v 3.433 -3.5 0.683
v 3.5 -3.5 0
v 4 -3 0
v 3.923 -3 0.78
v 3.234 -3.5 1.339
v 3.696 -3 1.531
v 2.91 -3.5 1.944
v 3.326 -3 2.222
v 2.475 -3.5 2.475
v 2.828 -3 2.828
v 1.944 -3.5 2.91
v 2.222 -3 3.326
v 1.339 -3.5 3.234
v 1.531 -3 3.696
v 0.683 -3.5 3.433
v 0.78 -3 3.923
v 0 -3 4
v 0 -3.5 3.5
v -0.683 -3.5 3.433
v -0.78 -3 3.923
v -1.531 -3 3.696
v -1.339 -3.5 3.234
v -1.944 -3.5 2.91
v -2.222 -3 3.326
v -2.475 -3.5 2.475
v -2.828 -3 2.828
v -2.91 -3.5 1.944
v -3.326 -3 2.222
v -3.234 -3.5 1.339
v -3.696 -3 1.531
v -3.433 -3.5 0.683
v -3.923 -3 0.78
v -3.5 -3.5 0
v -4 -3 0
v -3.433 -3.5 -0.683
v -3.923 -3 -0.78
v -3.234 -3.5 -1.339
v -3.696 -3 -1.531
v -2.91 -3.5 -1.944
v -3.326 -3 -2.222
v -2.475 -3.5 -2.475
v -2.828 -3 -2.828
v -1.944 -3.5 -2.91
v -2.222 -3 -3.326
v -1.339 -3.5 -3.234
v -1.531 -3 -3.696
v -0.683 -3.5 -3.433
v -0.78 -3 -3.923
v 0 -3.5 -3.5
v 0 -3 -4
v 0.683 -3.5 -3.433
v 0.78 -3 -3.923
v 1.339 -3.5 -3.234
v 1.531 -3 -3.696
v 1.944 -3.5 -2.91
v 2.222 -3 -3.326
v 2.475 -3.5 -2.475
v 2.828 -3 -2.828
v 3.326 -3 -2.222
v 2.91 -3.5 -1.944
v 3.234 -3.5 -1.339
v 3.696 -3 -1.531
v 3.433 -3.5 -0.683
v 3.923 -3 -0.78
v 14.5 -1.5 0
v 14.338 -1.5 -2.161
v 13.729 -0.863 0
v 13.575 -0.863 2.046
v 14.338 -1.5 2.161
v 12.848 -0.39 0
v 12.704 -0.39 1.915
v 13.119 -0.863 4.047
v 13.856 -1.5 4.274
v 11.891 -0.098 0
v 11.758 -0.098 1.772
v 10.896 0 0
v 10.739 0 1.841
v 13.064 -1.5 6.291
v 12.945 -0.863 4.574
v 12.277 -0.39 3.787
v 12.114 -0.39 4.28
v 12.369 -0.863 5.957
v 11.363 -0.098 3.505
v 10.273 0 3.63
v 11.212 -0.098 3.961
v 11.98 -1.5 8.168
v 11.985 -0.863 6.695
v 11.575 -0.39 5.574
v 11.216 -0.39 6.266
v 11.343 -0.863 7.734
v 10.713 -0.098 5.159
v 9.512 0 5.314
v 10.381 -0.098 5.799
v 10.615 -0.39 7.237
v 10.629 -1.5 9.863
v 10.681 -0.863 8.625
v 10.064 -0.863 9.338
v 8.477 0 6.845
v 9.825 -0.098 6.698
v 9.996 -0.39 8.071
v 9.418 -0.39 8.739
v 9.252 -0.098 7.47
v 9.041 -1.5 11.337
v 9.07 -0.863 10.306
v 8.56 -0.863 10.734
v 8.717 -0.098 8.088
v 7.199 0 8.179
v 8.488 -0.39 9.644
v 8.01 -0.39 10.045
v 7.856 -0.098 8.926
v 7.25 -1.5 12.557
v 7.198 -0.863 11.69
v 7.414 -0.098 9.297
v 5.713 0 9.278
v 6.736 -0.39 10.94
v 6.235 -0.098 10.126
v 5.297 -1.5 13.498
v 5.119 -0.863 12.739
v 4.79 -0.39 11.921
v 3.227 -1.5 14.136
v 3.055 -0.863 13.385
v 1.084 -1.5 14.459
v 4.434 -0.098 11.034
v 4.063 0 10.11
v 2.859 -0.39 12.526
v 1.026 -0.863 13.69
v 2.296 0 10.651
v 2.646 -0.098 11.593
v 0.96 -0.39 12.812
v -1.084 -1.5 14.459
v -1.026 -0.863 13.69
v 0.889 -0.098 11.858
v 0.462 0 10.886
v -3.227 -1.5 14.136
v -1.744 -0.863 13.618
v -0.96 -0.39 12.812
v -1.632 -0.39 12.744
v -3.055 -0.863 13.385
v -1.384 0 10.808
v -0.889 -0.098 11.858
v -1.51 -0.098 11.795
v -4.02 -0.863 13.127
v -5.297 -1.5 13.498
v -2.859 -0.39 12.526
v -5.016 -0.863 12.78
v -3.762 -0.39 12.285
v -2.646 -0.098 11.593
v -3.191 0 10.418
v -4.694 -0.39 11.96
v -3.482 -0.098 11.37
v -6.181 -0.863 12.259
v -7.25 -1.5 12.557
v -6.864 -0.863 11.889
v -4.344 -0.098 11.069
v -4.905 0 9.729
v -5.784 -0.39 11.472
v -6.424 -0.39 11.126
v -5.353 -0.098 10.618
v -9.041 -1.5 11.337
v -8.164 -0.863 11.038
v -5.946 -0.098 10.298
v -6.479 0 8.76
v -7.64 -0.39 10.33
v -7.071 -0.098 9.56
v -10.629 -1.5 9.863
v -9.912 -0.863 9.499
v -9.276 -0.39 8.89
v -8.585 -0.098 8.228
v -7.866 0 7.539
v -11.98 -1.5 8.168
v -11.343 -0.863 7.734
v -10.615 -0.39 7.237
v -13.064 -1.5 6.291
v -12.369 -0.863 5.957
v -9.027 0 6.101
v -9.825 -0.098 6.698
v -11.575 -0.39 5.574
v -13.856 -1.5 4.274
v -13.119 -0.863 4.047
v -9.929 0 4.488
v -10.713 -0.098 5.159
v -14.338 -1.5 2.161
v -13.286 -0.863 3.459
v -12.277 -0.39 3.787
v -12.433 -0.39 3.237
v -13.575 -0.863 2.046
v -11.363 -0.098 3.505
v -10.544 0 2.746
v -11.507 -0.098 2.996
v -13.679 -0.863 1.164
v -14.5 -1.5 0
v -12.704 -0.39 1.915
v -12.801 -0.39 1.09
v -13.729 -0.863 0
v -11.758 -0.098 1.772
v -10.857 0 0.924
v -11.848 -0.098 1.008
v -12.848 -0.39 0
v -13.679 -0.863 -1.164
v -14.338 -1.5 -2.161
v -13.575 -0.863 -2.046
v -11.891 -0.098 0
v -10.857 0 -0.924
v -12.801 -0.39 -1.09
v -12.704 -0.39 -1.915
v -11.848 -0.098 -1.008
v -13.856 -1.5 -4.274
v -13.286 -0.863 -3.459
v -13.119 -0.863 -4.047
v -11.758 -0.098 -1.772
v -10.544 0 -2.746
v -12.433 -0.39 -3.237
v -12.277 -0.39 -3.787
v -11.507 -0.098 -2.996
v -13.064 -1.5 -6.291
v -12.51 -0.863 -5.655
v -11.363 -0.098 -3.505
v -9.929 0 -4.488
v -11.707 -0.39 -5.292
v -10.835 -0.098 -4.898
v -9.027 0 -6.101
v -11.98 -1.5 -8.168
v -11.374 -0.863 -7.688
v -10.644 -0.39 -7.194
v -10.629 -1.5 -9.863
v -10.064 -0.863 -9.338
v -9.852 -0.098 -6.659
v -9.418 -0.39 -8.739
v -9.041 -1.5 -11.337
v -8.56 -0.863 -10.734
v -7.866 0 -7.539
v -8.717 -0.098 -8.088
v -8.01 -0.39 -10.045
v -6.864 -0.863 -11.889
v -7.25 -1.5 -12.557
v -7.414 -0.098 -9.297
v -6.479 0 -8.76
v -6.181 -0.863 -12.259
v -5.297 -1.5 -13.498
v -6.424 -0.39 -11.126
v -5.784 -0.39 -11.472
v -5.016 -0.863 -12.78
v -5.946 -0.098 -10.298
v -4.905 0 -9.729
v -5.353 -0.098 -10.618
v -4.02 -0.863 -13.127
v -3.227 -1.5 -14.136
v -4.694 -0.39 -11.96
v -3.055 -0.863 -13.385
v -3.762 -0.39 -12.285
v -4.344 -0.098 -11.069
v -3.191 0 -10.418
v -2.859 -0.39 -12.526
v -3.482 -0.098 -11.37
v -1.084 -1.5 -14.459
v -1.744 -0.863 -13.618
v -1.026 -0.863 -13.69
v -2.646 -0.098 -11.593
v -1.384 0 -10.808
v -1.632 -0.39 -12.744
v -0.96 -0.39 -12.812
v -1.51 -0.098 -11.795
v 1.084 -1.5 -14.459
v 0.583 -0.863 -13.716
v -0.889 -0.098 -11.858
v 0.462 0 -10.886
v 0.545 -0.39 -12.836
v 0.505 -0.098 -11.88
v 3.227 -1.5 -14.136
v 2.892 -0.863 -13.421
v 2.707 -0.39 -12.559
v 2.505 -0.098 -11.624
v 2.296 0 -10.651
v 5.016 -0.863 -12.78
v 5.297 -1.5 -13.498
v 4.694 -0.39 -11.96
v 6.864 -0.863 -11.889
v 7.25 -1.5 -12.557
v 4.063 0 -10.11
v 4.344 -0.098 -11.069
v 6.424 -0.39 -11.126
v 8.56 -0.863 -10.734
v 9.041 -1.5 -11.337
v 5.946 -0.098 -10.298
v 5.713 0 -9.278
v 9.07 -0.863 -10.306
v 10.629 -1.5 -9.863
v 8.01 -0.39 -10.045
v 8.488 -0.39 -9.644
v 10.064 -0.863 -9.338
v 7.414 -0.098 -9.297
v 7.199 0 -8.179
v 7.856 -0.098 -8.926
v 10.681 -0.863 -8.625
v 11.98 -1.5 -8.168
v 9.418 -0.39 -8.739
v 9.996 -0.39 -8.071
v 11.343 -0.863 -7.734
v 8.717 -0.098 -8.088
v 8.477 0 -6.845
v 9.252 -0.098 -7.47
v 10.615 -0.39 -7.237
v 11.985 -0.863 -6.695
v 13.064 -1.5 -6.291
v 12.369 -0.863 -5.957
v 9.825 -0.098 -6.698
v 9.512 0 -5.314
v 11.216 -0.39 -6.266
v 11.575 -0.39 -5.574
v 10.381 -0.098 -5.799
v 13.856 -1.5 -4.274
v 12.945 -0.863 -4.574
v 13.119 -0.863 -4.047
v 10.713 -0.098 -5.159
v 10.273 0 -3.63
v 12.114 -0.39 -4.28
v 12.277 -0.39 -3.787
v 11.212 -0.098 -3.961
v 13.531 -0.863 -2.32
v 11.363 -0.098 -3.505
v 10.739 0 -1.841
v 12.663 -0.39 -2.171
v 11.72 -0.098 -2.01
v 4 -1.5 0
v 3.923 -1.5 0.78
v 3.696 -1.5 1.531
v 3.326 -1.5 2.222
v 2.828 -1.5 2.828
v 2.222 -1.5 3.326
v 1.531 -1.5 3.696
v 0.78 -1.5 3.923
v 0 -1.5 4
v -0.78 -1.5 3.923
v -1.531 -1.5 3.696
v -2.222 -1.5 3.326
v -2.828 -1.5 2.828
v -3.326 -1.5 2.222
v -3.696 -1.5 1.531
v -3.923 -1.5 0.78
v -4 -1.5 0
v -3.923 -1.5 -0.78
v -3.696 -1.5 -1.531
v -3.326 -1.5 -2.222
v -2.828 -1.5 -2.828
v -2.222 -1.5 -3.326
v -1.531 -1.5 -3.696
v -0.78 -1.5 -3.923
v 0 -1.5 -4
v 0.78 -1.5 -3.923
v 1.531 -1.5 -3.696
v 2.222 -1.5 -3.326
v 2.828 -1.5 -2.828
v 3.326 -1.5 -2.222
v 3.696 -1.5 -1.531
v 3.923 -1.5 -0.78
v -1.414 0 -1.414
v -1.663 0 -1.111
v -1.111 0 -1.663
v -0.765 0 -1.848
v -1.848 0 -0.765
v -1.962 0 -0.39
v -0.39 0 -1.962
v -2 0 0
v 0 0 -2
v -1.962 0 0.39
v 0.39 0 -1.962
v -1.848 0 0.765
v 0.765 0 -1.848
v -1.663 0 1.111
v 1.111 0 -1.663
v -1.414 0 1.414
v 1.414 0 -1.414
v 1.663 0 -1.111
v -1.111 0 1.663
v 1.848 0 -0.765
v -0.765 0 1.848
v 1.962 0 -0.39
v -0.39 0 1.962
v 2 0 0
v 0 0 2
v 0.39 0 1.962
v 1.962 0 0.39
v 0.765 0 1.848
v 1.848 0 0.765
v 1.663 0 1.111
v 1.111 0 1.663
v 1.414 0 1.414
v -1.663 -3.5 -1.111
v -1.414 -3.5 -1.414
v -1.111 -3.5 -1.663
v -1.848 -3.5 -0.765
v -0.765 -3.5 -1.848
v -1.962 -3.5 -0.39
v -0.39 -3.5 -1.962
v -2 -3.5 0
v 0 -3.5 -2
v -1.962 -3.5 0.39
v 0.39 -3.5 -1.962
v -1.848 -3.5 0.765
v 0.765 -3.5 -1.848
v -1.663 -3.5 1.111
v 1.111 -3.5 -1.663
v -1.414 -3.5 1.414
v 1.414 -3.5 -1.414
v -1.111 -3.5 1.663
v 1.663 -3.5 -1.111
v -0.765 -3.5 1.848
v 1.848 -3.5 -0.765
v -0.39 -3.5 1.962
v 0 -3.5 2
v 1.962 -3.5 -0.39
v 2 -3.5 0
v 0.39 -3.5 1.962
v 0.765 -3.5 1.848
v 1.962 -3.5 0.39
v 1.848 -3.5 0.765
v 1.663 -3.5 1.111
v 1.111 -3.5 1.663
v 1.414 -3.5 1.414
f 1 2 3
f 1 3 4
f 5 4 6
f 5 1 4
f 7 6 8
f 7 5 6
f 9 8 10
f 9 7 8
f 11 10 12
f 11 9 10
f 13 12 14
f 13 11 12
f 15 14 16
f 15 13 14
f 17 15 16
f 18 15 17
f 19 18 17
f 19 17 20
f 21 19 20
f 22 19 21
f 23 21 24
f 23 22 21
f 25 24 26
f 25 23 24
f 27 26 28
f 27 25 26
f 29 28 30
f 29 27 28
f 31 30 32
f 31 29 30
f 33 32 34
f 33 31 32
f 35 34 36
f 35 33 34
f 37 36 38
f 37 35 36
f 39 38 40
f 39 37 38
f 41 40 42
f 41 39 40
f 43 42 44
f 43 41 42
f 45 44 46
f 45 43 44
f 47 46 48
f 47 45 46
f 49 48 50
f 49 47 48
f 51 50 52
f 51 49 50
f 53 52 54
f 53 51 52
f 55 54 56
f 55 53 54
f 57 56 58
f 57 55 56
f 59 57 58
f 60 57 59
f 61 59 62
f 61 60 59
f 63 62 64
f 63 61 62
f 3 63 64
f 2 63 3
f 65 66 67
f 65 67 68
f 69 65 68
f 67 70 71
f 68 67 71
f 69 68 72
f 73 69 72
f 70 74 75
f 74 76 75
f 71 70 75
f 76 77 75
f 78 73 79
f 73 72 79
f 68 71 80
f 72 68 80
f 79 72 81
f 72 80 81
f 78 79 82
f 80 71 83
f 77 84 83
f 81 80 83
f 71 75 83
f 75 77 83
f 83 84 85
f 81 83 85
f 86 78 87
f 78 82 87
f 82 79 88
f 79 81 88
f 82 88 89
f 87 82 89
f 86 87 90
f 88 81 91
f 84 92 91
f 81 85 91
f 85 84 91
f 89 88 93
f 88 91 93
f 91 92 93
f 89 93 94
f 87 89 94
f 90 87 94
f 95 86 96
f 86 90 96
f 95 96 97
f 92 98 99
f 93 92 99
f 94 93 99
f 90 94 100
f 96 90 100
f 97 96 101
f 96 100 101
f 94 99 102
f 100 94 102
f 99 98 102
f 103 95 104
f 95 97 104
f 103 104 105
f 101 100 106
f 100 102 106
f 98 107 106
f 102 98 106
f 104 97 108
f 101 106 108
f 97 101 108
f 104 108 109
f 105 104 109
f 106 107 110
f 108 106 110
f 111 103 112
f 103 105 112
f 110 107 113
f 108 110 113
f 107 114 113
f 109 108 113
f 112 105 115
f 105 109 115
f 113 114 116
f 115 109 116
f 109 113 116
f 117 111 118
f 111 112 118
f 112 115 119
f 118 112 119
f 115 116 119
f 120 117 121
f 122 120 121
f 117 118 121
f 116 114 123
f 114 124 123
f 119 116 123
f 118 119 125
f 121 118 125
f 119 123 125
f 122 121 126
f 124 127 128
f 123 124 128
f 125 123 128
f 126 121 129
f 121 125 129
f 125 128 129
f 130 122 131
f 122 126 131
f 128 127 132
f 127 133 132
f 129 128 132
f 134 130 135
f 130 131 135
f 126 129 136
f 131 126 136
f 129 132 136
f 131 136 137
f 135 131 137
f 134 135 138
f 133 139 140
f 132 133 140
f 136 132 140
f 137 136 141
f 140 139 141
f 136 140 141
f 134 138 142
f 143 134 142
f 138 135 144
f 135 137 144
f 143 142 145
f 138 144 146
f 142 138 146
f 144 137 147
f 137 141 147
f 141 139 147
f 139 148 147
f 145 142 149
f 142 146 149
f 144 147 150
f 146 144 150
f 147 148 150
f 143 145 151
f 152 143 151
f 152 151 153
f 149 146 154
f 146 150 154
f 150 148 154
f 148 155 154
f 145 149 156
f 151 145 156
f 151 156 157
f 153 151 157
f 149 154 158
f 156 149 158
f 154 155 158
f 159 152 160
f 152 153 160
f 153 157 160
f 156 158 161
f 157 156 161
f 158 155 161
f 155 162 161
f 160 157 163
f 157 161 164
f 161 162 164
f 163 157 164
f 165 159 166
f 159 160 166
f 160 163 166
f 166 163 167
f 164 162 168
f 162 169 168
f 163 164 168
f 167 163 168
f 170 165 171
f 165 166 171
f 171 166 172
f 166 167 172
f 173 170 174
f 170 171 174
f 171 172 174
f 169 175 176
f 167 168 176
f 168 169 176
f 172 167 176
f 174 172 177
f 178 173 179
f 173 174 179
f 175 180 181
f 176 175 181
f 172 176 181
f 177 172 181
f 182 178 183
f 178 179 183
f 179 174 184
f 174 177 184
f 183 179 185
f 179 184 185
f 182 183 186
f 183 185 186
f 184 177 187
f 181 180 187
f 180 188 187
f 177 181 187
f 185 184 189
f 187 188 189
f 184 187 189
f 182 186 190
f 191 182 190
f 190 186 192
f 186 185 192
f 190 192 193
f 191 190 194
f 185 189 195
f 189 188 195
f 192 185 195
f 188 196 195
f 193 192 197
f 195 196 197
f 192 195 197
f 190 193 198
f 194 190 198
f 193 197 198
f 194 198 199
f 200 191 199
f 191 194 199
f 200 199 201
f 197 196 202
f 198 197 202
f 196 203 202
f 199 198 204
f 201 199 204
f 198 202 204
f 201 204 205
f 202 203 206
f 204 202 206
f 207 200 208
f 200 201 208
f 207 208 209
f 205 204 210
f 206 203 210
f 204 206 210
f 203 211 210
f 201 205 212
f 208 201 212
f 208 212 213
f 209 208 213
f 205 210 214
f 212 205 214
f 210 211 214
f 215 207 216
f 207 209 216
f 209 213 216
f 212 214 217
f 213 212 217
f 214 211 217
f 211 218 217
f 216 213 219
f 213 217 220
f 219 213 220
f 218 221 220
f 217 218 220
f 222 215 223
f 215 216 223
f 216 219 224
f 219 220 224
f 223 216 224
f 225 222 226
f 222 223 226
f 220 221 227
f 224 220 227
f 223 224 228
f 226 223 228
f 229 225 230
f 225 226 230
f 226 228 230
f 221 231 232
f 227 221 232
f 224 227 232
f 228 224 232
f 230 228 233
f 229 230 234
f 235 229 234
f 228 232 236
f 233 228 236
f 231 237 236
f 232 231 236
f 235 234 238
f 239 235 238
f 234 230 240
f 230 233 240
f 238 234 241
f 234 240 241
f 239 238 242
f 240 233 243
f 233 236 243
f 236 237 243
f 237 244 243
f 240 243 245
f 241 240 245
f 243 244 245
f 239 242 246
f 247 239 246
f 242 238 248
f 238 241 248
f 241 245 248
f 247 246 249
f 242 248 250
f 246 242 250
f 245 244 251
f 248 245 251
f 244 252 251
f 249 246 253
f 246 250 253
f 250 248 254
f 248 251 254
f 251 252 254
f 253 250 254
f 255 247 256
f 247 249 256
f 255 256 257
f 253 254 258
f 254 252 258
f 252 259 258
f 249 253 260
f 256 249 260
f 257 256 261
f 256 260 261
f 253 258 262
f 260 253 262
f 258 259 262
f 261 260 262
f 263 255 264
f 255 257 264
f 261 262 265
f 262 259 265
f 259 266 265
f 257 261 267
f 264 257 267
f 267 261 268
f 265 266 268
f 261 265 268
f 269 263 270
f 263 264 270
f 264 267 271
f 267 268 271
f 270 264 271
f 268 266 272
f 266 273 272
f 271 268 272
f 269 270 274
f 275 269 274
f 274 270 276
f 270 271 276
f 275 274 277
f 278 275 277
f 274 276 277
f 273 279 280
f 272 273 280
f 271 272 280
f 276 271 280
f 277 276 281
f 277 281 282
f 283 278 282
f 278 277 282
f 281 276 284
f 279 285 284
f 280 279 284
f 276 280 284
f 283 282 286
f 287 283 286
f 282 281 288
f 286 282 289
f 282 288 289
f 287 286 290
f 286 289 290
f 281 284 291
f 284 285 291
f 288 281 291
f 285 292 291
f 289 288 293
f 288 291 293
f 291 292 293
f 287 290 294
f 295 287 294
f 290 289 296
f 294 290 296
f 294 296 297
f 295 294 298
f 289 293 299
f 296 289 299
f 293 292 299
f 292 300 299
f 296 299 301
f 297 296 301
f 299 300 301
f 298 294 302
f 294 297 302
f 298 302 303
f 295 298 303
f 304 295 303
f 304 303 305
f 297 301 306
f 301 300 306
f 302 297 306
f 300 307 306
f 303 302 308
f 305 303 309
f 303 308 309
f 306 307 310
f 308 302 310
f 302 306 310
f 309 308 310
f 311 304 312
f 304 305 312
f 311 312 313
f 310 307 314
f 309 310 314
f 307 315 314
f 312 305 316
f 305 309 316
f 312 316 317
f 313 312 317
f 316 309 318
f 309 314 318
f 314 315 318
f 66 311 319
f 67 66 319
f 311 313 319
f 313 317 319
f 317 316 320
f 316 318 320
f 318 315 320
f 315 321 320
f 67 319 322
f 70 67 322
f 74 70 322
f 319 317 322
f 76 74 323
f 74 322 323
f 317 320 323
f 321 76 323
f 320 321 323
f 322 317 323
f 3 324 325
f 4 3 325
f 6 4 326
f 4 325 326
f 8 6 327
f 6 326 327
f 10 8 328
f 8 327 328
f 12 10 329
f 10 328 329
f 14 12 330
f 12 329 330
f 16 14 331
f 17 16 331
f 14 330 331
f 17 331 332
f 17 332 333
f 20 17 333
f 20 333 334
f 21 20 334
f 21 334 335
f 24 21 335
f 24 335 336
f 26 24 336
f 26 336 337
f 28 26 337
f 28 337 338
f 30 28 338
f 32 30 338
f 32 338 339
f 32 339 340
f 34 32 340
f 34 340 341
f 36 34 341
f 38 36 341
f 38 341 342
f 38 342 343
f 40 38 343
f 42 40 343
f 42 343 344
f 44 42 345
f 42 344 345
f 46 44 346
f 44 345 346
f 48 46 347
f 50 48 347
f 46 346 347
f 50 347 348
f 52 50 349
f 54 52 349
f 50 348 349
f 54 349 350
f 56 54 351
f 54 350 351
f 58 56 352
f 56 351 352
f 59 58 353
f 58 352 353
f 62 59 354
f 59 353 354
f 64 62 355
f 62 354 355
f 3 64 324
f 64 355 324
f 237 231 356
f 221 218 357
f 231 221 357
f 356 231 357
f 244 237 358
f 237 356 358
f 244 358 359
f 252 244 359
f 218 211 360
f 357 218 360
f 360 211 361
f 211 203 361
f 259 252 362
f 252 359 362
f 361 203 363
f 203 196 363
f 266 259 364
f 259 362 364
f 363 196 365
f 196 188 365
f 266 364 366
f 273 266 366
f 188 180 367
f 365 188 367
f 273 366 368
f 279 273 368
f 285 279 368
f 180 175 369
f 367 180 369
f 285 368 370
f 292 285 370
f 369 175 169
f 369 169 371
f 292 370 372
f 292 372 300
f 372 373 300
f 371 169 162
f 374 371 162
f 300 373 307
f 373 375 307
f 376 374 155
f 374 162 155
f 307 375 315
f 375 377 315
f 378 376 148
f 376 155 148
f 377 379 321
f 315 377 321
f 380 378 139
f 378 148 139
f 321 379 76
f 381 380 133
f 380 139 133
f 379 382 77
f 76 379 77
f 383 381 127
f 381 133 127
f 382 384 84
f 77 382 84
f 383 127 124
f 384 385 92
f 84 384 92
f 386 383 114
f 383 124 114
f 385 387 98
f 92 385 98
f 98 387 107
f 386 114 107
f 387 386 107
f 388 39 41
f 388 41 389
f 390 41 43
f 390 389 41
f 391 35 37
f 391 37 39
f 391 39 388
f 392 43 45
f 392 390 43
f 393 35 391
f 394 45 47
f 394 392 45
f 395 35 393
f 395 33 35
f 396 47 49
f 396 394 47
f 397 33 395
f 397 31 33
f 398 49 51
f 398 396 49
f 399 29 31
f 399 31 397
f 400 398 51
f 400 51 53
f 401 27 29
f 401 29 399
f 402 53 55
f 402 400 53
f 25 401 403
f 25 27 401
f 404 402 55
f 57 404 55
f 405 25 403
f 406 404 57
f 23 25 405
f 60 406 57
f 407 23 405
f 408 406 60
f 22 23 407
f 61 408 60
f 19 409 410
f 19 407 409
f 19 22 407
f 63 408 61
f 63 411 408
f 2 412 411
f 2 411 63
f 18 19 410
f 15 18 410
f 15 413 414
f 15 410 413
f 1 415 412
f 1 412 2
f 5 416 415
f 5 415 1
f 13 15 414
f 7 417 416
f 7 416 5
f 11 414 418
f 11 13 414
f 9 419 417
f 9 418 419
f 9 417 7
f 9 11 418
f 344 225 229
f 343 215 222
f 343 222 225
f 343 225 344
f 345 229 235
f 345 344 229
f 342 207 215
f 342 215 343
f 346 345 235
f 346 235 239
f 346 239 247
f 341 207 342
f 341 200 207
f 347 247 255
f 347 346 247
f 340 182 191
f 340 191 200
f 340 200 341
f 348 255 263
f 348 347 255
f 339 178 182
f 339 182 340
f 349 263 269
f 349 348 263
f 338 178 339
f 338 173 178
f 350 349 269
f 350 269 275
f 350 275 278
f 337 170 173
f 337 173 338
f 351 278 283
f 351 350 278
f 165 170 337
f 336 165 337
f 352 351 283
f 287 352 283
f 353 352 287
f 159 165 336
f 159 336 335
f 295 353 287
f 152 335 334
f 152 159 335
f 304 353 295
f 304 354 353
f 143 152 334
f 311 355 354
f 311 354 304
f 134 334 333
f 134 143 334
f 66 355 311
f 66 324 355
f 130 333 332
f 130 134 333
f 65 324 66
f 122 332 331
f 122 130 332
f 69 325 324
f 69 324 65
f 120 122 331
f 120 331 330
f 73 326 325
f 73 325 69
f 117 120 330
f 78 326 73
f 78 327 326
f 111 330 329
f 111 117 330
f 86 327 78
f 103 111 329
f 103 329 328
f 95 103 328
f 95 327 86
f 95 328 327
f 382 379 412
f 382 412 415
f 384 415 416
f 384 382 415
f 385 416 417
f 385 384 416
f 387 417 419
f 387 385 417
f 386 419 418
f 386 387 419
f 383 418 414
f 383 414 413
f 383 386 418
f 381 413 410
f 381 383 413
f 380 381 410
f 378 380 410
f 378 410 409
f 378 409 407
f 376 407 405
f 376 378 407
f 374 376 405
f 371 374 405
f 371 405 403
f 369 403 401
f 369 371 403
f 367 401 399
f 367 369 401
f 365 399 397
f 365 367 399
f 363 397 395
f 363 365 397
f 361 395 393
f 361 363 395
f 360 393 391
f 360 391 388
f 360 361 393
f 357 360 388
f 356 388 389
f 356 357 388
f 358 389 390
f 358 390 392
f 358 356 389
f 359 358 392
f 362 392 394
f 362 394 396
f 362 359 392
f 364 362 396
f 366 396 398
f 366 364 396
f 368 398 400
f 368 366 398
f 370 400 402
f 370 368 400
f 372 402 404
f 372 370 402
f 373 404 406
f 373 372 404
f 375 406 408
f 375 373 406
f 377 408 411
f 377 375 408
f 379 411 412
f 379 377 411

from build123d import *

# Parameters (mm, degrees)
F0_R     = 14.5
F0_R_2   = 4
F1_DEPTH = 1.5
F0_R_3   = 2
F2_DEPTH = 3.5
F3_SIZE  = 0.5


# Not quite as in the source:
# - a fillet or chamfer that OpenCascade refuses, or shapes differently, is made with other operations: its cross-section is extruded or revolved along the edge and cut away or added


with BuildPart() as f1:
    # F0 (on Front) → F1 (new body)
    with BuildSketch(Plane.XZ):
        Circle(F0_R)
        Circle(F0_R_2, mode=Mode.SUBTRACT)
    extrude(amount=F1_DEPTH)

    # F0 (on Front) → F2 (join)
    with BuildSketch(Plane.XZ):
        Circle(F0_R_2)
        Circle(F0_R_3, mode=Mode.SUBTRACT)
    extrude(amount=F2_DEPTH)

    # F3
    f3_edges = [f1.edges().sort_by_distance(p)[0] for p in [
        (-4, -3.5, 0),
    ]]
    chamfer(f3_edges, length=F3_SIZE)

    # F4: fillet of radius 5.08 on 1 edges, made by hand

    # F4_s1 → F4_t2 (revolve, cut)
    with BuildSketch(Plane.XY):
        with BuildLine():
            ThreePointArc((14.5, -1.5), (12.8477578714, -0.3899680172), (10.8958357418, 0))
            Line((10.8958357418, 0), (14.5, 0))
            Line((14.5, 0), (14.5, -1.5))
        make_face()
    revolve(axis=Axis((0, 0, 0), (0, -1, 0)), mode=Mode.SUBTRACT)


solid = f1.part
